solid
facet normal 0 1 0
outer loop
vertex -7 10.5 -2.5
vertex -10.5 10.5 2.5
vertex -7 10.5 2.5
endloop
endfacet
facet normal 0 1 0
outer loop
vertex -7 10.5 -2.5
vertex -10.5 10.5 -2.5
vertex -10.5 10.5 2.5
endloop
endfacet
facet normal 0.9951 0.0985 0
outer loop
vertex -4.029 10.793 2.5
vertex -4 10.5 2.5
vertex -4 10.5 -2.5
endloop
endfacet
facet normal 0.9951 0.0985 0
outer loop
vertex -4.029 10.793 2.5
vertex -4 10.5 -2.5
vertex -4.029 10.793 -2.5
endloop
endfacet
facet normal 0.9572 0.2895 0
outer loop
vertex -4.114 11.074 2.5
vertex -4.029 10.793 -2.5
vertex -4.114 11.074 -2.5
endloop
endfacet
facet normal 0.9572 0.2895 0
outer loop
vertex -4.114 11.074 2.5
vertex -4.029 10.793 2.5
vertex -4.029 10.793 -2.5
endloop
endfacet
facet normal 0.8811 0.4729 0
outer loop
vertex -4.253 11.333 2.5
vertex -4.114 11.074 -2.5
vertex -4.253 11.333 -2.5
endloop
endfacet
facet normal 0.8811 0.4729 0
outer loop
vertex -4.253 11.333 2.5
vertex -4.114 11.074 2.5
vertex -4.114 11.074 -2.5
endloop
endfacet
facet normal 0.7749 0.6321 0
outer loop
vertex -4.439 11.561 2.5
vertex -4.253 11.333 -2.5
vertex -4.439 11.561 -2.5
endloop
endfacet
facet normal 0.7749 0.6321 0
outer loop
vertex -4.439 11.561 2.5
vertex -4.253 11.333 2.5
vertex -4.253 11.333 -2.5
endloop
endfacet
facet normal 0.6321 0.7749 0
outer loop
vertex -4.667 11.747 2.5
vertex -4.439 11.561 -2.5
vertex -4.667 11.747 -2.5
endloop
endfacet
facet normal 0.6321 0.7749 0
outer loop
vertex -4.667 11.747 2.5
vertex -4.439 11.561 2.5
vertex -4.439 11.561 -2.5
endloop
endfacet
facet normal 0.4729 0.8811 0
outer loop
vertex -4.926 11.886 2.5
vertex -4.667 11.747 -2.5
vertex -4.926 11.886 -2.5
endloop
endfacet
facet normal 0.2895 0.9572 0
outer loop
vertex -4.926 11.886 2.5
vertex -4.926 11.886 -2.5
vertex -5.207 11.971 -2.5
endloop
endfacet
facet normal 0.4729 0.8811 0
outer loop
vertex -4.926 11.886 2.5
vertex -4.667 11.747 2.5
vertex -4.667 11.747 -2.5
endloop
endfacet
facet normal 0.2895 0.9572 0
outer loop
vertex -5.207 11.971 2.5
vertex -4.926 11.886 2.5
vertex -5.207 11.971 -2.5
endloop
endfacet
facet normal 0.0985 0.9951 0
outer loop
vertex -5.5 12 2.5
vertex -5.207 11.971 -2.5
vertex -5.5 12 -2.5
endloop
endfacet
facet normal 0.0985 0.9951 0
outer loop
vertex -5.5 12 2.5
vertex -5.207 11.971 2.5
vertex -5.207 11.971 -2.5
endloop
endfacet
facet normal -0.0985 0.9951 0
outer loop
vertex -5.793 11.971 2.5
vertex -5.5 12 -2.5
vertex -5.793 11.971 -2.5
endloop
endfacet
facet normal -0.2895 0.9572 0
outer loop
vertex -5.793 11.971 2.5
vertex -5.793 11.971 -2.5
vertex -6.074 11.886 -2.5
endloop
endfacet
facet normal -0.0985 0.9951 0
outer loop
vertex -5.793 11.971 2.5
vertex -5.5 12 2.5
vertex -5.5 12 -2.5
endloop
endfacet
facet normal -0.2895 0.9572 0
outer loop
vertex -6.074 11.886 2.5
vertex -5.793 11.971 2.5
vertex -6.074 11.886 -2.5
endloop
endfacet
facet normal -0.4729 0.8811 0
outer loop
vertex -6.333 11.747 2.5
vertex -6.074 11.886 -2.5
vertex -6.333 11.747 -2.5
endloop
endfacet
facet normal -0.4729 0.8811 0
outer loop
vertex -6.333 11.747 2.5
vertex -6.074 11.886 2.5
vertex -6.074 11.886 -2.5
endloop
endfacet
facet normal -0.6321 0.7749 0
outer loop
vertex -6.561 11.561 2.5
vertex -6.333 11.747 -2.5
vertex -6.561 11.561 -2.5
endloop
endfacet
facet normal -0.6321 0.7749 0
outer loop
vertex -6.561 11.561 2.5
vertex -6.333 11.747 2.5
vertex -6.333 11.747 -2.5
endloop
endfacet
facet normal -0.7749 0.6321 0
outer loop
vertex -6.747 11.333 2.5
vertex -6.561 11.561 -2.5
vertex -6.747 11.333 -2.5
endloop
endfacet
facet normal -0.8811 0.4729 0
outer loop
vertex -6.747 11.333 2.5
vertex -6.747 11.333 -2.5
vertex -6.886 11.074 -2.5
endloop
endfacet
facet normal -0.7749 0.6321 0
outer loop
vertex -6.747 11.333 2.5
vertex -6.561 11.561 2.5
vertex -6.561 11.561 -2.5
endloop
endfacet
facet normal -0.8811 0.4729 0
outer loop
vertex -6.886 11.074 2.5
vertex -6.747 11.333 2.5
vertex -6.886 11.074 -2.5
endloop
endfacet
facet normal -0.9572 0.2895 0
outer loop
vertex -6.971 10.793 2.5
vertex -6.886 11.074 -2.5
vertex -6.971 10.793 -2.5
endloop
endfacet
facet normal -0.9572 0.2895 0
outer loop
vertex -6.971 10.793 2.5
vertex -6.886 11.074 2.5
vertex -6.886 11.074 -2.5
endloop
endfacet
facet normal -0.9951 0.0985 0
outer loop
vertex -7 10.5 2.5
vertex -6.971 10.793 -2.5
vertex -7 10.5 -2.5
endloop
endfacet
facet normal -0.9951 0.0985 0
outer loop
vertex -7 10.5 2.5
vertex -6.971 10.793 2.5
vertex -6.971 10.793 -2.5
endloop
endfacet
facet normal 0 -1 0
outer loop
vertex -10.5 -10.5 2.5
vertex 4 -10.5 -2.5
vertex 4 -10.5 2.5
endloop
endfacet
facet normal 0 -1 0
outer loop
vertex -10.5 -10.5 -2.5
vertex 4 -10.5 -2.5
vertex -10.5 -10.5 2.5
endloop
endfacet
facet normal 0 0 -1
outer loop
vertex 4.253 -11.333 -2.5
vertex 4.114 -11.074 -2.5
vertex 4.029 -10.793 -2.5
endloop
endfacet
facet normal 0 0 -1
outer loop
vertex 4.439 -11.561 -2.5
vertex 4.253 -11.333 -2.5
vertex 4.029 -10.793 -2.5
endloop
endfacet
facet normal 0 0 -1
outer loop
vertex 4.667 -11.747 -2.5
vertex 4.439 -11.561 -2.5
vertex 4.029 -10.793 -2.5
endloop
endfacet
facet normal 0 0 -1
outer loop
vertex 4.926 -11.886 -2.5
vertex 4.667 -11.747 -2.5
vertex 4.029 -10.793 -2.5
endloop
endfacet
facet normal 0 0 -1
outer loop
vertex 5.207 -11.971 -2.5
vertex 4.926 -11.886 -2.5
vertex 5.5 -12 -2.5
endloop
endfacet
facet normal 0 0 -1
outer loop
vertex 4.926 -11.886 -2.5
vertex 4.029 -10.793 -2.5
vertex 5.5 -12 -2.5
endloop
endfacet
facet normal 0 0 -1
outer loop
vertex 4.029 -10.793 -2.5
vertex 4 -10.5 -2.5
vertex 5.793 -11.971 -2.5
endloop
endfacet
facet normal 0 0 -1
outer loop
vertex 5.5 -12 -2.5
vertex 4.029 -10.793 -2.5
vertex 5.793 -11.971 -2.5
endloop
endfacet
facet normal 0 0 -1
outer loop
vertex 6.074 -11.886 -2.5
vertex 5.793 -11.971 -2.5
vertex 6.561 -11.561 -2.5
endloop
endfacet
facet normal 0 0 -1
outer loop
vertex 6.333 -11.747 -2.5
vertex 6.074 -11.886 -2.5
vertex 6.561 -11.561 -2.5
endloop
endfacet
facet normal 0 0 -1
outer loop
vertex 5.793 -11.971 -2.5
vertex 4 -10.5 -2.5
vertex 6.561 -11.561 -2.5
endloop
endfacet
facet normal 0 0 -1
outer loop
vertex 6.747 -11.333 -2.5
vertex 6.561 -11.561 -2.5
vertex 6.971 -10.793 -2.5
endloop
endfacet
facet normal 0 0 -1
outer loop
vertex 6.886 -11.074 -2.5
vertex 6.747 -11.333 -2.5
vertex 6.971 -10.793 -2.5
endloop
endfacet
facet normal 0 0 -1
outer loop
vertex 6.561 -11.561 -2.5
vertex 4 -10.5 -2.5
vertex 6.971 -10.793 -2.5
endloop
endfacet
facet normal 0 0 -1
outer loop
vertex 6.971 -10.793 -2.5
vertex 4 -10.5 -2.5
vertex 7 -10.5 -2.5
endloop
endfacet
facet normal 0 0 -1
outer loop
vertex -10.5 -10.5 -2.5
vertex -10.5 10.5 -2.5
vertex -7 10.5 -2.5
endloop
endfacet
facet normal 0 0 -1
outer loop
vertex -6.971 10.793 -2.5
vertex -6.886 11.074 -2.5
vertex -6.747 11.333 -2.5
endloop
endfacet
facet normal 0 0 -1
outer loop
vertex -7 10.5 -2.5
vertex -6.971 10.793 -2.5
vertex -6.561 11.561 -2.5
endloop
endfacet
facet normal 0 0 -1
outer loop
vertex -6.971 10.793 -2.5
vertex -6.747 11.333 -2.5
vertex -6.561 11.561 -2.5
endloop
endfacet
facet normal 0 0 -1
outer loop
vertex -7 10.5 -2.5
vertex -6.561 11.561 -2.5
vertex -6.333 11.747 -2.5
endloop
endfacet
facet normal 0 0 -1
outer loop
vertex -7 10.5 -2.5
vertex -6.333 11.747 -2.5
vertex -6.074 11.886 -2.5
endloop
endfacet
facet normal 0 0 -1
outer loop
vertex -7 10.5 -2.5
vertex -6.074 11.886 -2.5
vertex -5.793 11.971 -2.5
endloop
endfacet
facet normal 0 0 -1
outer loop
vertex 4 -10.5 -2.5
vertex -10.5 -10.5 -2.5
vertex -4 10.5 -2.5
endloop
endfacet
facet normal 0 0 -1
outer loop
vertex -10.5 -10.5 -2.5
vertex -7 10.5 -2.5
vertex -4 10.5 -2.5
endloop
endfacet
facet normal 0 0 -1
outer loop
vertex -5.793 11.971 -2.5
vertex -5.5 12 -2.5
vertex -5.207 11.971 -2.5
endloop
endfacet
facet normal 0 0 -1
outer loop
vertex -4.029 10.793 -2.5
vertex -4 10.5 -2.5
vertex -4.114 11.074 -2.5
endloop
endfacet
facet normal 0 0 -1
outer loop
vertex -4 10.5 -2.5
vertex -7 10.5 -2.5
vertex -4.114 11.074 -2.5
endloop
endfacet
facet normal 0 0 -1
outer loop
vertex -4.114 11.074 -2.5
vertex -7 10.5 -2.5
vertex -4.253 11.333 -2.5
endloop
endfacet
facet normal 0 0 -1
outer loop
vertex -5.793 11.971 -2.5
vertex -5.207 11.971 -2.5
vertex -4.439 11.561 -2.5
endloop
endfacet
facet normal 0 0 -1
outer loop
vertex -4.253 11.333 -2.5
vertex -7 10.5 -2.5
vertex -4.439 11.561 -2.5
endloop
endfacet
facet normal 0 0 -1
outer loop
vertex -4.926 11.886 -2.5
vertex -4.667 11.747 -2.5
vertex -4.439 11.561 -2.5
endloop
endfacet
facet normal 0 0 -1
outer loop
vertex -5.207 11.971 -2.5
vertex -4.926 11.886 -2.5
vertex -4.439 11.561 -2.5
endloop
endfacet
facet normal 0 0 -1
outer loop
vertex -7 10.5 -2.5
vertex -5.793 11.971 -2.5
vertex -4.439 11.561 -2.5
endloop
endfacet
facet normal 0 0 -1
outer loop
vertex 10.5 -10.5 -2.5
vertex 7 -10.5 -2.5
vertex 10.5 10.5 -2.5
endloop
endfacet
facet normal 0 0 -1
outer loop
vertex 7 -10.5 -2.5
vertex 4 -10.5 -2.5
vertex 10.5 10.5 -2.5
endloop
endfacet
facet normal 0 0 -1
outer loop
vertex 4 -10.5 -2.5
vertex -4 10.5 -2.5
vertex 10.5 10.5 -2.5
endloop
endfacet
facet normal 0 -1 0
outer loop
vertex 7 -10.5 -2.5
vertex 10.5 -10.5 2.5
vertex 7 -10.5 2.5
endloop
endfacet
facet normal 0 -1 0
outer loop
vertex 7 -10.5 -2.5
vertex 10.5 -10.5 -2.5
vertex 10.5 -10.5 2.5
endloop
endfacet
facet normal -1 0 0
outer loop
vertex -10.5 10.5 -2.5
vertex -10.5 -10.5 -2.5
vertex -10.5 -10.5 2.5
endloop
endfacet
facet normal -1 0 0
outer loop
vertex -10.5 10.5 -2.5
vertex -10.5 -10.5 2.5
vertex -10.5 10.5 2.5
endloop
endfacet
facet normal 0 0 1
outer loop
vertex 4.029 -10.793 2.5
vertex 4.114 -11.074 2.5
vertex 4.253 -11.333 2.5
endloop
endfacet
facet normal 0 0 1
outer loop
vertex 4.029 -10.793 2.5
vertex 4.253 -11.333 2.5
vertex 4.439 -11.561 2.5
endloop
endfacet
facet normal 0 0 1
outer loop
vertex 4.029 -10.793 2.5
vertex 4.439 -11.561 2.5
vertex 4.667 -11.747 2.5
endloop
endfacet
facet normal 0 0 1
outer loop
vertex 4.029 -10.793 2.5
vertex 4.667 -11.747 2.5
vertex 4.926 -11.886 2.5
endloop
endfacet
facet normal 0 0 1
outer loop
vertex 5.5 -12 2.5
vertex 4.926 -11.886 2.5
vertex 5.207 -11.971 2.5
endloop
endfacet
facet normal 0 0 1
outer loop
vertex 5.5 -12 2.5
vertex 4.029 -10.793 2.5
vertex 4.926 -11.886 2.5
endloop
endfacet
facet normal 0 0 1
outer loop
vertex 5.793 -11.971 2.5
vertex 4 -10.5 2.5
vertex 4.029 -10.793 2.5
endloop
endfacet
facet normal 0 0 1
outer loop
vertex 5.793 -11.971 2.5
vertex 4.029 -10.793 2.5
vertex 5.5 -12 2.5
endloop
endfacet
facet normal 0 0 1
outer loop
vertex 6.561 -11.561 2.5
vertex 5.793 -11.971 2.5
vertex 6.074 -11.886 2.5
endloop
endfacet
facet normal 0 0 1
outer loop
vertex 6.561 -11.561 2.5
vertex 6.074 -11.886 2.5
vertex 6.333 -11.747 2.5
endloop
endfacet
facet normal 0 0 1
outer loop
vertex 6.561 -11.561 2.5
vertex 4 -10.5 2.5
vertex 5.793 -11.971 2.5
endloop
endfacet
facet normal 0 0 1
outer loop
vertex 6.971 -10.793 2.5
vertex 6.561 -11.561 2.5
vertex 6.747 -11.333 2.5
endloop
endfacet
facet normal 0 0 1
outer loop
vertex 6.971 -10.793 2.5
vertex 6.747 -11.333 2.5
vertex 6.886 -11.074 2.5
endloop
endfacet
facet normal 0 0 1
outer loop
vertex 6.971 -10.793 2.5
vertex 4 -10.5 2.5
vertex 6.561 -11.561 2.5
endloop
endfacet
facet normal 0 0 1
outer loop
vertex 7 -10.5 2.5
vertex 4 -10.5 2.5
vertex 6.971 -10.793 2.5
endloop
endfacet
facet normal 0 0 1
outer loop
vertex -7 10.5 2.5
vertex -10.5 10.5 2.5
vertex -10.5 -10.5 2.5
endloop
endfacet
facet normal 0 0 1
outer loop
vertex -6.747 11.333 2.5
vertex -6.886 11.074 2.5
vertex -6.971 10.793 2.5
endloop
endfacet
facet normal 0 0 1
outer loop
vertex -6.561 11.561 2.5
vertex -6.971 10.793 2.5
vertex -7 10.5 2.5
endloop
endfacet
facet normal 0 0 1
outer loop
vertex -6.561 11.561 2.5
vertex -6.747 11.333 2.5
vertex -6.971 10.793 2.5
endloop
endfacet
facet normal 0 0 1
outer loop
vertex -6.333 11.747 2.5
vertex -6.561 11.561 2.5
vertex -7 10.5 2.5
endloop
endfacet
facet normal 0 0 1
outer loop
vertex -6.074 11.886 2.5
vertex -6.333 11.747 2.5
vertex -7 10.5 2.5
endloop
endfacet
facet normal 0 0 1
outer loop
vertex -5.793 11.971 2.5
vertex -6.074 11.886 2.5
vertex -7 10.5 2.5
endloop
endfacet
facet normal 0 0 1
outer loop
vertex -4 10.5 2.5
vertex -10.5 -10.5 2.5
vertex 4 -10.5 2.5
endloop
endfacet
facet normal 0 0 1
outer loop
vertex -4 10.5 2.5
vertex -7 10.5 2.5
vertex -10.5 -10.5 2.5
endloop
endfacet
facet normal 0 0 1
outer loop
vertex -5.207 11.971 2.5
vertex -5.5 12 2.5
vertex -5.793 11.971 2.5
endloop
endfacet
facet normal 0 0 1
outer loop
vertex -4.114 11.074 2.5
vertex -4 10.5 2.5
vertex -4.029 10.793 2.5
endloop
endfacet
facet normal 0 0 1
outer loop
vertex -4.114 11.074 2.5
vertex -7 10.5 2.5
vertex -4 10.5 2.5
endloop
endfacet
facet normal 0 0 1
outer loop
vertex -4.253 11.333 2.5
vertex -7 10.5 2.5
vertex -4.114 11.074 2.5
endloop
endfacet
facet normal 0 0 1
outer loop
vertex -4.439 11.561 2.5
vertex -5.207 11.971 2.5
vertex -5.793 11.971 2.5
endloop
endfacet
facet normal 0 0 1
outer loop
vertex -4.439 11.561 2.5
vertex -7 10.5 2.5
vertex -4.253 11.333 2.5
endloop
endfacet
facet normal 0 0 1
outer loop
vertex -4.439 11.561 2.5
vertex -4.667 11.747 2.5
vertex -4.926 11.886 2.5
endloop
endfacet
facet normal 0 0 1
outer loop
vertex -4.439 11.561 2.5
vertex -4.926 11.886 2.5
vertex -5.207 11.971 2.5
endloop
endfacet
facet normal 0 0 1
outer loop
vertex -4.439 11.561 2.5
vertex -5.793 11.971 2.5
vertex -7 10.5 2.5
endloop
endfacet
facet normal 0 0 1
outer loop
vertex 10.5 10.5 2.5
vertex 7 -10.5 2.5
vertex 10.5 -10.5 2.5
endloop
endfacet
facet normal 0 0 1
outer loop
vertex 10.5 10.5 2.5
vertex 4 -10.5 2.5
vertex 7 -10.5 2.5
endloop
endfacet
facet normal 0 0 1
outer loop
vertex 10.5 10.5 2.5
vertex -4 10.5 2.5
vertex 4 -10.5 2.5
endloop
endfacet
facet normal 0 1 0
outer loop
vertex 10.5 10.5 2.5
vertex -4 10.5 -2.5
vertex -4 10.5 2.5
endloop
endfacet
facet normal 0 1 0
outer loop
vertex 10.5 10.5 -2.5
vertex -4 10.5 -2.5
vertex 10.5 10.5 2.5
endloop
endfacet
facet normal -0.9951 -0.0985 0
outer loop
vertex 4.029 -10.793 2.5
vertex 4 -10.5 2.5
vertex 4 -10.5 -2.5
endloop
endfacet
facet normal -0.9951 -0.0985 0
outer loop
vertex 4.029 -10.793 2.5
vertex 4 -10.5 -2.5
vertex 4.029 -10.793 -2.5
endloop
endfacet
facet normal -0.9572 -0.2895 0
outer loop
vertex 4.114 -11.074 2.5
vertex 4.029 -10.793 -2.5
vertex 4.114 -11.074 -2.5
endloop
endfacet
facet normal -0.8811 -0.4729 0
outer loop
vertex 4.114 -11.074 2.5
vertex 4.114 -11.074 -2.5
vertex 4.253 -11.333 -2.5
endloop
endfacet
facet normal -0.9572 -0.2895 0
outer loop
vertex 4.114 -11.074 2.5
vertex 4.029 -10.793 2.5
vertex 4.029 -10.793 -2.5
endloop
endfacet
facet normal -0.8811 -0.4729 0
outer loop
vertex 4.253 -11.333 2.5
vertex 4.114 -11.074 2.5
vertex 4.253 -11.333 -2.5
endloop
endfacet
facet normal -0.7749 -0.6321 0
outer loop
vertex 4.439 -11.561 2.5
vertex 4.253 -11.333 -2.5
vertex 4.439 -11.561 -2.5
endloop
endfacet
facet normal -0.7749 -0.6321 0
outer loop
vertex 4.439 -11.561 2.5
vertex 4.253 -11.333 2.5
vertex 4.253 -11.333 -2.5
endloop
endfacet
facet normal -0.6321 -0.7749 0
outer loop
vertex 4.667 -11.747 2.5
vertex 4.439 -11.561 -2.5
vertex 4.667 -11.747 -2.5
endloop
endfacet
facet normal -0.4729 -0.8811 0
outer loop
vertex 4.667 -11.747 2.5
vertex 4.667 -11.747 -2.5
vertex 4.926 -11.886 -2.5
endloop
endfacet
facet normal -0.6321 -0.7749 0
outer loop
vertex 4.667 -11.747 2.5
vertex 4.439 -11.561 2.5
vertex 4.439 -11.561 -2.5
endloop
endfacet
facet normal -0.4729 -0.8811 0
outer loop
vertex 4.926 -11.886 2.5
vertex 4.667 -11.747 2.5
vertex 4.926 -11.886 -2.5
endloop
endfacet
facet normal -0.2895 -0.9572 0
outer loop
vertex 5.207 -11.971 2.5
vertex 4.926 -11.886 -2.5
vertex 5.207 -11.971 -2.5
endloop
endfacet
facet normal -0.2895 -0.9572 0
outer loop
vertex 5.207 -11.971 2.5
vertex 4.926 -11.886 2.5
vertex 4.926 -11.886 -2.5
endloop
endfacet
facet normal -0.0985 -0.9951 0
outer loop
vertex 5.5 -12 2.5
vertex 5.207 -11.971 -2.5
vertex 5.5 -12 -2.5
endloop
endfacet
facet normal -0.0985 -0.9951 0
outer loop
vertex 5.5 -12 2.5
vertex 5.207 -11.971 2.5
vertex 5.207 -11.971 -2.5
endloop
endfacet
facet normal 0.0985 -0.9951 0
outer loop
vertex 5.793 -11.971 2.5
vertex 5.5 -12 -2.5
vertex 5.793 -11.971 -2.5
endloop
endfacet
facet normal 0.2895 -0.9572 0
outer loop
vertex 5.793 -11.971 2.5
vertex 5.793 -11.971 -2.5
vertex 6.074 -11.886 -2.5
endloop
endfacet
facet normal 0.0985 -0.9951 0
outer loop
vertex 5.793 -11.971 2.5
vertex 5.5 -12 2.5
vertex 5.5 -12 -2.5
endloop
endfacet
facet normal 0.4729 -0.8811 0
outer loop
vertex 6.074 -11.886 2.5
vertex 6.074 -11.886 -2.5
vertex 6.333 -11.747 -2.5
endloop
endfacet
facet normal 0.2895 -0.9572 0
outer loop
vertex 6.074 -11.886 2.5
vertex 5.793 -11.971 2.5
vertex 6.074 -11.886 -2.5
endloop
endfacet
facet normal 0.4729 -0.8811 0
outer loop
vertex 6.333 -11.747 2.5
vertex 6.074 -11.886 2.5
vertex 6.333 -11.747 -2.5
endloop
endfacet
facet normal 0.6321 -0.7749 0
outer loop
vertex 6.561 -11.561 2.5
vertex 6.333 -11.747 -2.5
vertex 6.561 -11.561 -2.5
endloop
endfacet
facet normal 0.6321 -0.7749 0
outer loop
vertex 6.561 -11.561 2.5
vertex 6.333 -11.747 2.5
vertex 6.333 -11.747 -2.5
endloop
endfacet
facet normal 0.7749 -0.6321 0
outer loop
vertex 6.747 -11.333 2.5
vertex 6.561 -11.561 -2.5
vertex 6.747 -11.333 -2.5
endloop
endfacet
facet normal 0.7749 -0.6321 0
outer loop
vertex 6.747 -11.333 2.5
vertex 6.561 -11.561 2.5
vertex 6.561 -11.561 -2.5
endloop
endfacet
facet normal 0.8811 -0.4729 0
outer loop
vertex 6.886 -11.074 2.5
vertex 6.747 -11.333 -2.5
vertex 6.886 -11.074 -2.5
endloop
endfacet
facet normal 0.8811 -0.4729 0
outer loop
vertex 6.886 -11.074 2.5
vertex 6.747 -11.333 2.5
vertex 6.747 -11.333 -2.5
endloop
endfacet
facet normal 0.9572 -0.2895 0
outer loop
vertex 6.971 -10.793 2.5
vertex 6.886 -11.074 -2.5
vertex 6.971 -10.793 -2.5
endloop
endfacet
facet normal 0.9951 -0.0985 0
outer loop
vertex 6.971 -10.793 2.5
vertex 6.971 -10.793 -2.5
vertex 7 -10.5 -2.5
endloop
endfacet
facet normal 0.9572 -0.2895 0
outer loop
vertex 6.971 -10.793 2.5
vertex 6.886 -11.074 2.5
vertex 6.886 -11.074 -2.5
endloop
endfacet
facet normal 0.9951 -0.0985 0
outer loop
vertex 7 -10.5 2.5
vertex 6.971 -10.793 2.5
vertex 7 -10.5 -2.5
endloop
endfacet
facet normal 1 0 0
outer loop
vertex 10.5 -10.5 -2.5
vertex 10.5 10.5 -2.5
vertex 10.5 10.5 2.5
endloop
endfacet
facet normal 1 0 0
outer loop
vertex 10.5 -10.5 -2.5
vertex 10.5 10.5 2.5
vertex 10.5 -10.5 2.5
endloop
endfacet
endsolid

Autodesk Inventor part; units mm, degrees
ref_plane "YZ Plane" through (0, 0, 0) normal (1, 0, 0) x (0, 1, 0)
ref_plane "XZ Plane" through (0, 0, 0) normal (0, 1, 0) x (-1, 0, 0)
ref_plane "XY Plane" through (0, 0, 0) normal (0, 0, 1) x (1, 0, 0)
sketch "Skizze1" plane through (0, 0, 0) normal (0, 0, 1) x (1, 0, 0)
  line L0 (-10.5, 10.5) -> (10.5, 10.5)
  line L1 (10.5, 10.5) -> (10.5, -10.5)
  line L2 (10.5, -10.5) -> (-10.5, -10.5)
  line L3 (-10.5, -10.5) -> (-10.5, 10.5)
  line L4 (-10.5, 10.5) -> (10.5, -10.5) construction
  line L5 (10.5, 10.5) -> (-10.5, -10.5) construction
  point P0 (0, 0)
  dimension "d0" = 21
  dimension "d1" = 21
extrude "Extrusion1" add sketch "Skizze1" along normal mid plane 5
sketch "Skizze2" plane through (0, 0, 2.5) normal (0, 0, 1) x (1, 0, 0)
  line L0 (10.5, 10.5) -> (-10.5, 10.5) projected
  circle A0 centre (-5.5, 10.5) radius 1.5
  circle A1 centre (5.5, -10.5) radius 1.5
  line L1 (-10.5, -10.5) -> (10.5, -10.5) projected
  point P0 (0, 0)
  point P1 (0, -10.5)
  point P2 (7, -10.5)
  point P3 (4, -10.5)
  point P4 (-7, 10.5)
  point P5 (-4, 10.5)
  dimension "d4" = 3
  dimension "d5" = 3
  dimension "d6" = 5.5
  dimension "d7" = 5.5
extrude "Extrusion2" add sketch "Skizze2" against normal blind 5 contours L0 A0 | A1 L1 picked at (-5.1257, 11.0709) picked at (5.2587, -11.2635)
equation "\"d7\" = d6"
properties part number "Kühler"
